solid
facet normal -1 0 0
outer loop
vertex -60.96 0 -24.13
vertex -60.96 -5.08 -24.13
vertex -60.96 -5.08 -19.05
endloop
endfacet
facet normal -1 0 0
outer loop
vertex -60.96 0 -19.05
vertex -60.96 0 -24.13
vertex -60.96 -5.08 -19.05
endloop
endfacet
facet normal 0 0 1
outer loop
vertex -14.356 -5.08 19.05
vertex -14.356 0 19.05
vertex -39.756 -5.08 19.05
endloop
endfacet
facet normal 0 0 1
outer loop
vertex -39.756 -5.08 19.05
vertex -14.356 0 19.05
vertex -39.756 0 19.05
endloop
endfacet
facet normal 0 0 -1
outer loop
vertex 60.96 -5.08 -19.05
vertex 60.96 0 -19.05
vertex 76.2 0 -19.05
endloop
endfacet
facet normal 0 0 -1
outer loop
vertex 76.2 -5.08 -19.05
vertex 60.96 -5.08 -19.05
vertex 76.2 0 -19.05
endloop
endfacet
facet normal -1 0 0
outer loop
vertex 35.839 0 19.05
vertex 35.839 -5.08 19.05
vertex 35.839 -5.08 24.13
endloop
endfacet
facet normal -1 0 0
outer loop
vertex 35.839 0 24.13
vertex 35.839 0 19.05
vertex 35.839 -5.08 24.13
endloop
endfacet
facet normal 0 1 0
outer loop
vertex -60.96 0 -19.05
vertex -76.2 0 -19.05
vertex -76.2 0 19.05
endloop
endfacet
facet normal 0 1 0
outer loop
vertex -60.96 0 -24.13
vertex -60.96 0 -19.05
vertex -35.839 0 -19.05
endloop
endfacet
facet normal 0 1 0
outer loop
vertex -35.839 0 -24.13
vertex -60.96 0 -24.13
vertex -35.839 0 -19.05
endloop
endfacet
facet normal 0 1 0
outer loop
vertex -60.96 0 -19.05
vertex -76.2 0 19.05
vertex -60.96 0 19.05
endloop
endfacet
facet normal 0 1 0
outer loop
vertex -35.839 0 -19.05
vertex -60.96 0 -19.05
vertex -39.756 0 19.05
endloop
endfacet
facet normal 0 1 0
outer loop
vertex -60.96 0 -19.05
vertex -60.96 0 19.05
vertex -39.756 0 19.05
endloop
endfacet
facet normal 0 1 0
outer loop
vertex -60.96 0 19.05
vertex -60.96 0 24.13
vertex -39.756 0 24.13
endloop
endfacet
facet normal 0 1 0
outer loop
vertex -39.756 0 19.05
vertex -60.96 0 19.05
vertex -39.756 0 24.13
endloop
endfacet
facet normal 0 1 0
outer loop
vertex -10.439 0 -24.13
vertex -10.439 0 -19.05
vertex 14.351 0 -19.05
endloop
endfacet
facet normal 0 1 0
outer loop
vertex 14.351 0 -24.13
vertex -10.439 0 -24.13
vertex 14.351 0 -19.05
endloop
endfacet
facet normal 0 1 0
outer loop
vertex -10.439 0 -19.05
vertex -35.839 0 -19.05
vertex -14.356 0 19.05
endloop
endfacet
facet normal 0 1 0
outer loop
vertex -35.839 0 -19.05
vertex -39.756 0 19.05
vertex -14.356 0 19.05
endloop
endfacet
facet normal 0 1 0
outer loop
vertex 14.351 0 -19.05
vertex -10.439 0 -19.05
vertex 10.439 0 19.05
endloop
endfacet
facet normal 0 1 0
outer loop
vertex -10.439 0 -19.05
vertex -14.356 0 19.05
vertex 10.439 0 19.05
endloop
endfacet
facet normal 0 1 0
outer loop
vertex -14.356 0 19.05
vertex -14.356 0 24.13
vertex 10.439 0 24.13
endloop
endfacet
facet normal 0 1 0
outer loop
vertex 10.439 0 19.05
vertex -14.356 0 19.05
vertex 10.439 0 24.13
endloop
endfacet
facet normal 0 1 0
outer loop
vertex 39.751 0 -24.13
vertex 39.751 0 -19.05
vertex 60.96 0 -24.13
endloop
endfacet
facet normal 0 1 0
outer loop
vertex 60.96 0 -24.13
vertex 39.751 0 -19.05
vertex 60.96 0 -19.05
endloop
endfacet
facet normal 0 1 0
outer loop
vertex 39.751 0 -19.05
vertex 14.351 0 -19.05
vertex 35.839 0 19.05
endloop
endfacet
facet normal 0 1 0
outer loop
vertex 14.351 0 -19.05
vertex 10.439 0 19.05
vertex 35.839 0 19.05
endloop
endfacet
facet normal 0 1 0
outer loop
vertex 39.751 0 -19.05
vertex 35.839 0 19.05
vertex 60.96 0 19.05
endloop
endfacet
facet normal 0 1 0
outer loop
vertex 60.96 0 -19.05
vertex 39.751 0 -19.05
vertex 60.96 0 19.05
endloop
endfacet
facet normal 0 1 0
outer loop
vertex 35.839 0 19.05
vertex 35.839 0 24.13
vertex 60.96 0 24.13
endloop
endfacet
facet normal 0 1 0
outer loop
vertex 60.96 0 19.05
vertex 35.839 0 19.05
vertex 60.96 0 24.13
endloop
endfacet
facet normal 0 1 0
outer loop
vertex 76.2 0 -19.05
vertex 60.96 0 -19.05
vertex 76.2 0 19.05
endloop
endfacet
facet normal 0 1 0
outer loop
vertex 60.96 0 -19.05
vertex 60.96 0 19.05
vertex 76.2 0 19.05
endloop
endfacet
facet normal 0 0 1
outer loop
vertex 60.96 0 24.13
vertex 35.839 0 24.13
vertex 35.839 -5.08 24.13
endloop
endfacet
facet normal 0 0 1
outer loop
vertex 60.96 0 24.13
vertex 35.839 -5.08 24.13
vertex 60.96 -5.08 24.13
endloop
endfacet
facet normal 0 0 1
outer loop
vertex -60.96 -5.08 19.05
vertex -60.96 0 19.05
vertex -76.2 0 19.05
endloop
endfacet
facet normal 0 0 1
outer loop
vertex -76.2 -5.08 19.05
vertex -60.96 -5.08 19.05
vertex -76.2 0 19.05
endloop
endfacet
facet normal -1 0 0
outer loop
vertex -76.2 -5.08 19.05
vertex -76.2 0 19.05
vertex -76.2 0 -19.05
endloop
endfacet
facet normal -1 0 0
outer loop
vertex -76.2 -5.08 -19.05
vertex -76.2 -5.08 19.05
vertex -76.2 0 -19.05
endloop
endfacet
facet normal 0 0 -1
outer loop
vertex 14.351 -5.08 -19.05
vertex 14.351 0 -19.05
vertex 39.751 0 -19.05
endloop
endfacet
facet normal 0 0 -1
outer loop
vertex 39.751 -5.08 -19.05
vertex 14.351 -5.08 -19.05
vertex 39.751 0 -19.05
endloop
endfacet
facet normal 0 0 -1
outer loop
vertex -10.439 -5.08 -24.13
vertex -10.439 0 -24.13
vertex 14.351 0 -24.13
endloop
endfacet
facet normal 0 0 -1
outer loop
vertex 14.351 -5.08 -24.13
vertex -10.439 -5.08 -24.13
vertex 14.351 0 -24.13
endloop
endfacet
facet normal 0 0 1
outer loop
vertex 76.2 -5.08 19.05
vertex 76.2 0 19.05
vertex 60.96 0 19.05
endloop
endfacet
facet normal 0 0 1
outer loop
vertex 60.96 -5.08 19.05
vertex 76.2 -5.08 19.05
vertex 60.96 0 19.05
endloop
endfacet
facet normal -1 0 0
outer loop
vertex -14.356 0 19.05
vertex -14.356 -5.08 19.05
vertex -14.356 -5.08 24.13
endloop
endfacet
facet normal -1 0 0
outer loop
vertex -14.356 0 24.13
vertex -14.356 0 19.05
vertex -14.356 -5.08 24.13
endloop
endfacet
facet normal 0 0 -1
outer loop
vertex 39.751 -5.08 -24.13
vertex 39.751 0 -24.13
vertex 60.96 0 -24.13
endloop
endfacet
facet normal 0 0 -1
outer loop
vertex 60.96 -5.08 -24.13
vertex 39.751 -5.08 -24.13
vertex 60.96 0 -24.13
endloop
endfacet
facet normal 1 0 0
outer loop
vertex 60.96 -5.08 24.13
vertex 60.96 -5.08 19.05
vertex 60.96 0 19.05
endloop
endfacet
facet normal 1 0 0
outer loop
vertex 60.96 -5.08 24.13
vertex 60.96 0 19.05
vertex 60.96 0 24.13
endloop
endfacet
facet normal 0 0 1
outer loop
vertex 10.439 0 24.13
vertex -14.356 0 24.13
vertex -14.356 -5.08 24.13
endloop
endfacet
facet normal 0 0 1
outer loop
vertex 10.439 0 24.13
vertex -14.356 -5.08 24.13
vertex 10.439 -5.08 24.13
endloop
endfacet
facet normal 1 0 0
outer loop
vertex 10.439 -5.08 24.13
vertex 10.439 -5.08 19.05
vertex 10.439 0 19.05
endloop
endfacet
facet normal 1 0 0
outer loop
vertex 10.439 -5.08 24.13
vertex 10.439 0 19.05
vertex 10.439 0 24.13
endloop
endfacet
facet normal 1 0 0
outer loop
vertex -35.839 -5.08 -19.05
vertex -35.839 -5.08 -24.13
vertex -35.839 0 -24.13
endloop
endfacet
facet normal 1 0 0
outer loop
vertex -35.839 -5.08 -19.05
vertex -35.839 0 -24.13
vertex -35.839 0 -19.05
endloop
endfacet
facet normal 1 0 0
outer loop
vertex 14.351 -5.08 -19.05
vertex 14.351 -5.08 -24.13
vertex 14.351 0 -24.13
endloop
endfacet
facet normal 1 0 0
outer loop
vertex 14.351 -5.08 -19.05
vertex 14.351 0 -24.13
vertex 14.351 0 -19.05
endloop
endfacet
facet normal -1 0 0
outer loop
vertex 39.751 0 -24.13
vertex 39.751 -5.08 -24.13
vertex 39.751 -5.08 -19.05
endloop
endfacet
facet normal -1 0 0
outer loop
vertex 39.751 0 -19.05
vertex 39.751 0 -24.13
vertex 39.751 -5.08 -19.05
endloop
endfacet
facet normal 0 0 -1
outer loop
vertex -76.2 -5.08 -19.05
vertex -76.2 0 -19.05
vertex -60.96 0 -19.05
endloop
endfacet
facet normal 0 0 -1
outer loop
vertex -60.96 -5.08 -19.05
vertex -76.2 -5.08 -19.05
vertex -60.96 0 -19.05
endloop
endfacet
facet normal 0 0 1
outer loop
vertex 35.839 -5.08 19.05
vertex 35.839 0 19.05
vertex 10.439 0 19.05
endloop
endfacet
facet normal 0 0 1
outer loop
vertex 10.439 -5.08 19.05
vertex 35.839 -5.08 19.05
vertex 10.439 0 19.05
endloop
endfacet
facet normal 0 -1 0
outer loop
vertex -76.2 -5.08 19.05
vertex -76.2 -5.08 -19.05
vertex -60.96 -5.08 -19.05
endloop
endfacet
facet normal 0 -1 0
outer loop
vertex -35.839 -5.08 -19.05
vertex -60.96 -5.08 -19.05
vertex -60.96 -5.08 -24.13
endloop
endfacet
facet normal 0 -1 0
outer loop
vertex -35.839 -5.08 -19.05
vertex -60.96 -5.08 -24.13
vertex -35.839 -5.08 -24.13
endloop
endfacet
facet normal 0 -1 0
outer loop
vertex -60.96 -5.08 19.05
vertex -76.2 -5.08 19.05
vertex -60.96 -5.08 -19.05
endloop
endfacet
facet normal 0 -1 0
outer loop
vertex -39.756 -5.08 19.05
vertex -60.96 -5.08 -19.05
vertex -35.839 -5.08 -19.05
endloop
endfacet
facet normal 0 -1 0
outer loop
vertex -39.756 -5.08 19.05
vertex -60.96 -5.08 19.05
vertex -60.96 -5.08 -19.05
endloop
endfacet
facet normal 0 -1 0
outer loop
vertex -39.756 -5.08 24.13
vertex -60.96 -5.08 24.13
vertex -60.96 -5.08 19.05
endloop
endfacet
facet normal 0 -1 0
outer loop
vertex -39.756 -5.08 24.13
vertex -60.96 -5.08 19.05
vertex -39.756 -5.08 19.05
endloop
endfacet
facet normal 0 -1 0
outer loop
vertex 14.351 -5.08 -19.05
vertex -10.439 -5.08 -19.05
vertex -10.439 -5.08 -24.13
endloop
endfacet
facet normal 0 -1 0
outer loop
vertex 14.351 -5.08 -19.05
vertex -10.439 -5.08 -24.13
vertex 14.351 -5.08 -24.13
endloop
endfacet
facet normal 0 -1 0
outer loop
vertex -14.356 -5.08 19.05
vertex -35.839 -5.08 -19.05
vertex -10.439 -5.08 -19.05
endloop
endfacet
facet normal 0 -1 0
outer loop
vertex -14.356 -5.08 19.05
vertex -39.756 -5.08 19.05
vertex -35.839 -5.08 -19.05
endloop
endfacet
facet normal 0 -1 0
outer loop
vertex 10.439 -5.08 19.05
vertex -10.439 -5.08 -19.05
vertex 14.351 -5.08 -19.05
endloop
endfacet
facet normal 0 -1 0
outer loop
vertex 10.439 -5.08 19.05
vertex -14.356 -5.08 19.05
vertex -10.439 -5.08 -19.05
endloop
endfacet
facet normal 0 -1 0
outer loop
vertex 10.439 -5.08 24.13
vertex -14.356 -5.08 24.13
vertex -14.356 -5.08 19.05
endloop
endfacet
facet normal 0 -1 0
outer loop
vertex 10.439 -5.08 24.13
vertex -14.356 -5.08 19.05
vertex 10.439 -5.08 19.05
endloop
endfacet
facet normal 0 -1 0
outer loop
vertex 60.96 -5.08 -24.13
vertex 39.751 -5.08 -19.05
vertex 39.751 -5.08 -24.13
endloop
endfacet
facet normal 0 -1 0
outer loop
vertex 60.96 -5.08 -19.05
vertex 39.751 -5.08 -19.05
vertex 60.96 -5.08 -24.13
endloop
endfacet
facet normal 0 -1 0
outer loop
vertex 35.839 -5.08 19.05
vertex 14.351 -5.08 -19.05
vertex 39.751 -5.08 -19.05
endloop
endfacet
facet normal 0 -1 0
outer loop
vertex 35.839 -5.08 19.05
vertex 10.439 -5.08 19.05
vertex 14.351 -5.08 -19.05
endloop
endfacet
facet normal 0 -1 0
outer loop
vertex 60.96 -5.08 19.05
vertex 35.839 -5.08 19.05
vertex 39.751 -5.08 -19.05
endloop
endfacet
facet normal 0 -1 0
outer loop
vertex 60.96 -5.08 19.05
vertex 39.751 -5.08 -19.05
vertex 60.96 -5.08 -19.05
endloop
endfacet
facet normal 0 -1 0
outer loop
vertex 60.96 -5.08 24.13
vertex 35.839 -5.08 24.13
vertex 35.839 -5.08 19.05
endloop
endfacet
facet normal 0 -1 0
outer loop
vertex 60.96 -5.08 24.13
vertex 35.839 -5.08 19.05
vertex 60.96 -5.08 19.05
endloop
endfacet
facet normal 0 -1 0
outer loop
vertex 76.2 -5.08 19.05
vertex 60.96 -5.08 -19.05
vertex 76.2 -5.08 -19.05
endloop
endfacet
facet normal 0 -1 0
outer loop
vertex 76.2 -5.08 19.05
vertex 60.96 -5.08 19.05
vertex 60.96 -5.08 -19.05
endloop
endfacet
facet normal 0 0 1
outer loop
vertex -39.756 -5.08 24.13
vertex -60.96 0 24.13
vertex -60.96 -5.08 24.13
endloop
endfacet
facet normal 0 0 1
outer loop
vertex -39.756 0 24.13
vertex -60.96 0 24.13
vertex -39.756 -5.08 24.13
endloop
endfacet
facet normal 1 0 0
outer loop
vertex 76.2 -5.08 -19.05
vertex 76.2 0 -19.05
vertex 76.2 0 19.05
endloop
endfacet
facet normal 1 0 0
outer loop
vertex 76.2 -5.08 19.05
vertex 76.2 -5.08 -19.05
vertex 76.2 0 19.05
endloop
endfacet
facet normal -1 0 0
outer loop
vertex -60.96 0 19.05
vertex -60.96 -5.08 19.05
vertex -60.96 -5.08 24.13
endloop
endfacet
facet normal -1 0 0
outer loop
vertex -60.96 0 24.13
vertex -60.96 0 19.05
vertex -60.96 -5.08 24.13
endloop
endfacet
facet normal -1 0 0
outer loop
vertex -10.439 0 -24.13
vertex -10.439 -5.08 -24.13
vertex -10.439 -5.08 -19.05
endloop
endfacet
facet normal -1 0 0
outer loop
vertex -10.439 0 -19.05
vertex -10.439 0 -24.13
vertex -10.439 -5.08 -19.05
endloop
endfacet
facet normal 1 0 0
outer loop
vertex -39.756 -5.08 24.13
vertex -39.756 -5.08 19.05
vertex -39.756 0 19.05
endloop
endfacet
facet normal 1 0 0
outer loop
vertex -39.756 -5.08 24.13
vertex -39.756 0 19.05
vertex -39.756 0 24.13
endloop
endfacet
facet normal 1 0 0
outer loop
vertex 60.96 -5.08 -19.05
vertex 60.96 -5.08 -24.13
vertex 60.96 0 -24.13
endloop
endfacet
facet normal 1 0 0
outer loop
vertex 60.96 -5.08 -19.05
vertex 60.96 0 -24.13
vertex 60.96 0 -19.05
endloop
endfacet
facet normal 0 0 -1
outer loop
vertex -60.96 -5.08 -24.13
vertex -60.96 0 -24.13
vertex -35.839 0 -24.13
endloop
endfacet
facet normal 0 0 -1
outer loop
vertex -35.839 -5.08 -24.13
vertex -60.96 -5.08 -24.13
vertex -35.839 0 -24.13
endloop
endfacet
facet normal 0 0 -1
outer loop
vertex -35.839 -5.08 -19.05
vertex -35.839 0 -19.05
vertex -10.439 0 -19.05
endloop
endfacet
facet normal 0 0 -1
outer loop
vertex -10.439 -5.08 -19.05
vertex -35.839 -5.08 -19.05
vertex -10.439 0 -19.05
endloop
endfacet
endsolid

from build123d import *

# Parameters (mm, degrees)
F0_W     = 21.2041994
F0_H     = 5.08
F0_W_2   = 24.7952006
F0_W_3   = 25.1206
F0_W_4   = 24.7904
F0_W_5   = 21.209
F1_DEPTH = 5.08


# Not quite as in the source:
# - a feature names something its author has since deleted; it is built from what else it names


with BuildPart() as f1:
    # F0 (on Front) → F1 (new body)
    with BuildSketch(Plane.XZ):
        Polygon((60.96, -19.05), (76.2, -19.05), (76.2, 19.05), (60.96, 19.05), (35.8394, 19.05), (10.4394, 19.05), (-14.3558006, 19.05), (-39.7558006, 19.05), (-60.96, 19.05), (-76.2, 19.05), (-76.2, -19.05), (-60.96, -19.05), (-35.8394, -19.05), (-10.4394, -19.05), (14.351, -19.05), (39.751, -19.05), align=None)
        with Locations((-50.3579003, 21.59)):
            Rectangle(F0_W, F0_H)
        with Locations((-1.9582003, 21.59)):
            Rectangle(F0_W_2, F0_H)
        with Locations((48.3997, 21.59)):
            Rectangle(F0_W_3, F0_H)
        with Locations((1.9558, -21.59)):
            Rectangle(F0_W_4, F0_H)
        with Locations((50.3555, -21.59)):
            Rectangle(F0_W_5, F0_H)
        with Locations((-48.3997, -21.59)):
            Rectangle(F0_W_3, F0_H)
    extrude(amount=F1_DEPTH)


solid = f1.part
